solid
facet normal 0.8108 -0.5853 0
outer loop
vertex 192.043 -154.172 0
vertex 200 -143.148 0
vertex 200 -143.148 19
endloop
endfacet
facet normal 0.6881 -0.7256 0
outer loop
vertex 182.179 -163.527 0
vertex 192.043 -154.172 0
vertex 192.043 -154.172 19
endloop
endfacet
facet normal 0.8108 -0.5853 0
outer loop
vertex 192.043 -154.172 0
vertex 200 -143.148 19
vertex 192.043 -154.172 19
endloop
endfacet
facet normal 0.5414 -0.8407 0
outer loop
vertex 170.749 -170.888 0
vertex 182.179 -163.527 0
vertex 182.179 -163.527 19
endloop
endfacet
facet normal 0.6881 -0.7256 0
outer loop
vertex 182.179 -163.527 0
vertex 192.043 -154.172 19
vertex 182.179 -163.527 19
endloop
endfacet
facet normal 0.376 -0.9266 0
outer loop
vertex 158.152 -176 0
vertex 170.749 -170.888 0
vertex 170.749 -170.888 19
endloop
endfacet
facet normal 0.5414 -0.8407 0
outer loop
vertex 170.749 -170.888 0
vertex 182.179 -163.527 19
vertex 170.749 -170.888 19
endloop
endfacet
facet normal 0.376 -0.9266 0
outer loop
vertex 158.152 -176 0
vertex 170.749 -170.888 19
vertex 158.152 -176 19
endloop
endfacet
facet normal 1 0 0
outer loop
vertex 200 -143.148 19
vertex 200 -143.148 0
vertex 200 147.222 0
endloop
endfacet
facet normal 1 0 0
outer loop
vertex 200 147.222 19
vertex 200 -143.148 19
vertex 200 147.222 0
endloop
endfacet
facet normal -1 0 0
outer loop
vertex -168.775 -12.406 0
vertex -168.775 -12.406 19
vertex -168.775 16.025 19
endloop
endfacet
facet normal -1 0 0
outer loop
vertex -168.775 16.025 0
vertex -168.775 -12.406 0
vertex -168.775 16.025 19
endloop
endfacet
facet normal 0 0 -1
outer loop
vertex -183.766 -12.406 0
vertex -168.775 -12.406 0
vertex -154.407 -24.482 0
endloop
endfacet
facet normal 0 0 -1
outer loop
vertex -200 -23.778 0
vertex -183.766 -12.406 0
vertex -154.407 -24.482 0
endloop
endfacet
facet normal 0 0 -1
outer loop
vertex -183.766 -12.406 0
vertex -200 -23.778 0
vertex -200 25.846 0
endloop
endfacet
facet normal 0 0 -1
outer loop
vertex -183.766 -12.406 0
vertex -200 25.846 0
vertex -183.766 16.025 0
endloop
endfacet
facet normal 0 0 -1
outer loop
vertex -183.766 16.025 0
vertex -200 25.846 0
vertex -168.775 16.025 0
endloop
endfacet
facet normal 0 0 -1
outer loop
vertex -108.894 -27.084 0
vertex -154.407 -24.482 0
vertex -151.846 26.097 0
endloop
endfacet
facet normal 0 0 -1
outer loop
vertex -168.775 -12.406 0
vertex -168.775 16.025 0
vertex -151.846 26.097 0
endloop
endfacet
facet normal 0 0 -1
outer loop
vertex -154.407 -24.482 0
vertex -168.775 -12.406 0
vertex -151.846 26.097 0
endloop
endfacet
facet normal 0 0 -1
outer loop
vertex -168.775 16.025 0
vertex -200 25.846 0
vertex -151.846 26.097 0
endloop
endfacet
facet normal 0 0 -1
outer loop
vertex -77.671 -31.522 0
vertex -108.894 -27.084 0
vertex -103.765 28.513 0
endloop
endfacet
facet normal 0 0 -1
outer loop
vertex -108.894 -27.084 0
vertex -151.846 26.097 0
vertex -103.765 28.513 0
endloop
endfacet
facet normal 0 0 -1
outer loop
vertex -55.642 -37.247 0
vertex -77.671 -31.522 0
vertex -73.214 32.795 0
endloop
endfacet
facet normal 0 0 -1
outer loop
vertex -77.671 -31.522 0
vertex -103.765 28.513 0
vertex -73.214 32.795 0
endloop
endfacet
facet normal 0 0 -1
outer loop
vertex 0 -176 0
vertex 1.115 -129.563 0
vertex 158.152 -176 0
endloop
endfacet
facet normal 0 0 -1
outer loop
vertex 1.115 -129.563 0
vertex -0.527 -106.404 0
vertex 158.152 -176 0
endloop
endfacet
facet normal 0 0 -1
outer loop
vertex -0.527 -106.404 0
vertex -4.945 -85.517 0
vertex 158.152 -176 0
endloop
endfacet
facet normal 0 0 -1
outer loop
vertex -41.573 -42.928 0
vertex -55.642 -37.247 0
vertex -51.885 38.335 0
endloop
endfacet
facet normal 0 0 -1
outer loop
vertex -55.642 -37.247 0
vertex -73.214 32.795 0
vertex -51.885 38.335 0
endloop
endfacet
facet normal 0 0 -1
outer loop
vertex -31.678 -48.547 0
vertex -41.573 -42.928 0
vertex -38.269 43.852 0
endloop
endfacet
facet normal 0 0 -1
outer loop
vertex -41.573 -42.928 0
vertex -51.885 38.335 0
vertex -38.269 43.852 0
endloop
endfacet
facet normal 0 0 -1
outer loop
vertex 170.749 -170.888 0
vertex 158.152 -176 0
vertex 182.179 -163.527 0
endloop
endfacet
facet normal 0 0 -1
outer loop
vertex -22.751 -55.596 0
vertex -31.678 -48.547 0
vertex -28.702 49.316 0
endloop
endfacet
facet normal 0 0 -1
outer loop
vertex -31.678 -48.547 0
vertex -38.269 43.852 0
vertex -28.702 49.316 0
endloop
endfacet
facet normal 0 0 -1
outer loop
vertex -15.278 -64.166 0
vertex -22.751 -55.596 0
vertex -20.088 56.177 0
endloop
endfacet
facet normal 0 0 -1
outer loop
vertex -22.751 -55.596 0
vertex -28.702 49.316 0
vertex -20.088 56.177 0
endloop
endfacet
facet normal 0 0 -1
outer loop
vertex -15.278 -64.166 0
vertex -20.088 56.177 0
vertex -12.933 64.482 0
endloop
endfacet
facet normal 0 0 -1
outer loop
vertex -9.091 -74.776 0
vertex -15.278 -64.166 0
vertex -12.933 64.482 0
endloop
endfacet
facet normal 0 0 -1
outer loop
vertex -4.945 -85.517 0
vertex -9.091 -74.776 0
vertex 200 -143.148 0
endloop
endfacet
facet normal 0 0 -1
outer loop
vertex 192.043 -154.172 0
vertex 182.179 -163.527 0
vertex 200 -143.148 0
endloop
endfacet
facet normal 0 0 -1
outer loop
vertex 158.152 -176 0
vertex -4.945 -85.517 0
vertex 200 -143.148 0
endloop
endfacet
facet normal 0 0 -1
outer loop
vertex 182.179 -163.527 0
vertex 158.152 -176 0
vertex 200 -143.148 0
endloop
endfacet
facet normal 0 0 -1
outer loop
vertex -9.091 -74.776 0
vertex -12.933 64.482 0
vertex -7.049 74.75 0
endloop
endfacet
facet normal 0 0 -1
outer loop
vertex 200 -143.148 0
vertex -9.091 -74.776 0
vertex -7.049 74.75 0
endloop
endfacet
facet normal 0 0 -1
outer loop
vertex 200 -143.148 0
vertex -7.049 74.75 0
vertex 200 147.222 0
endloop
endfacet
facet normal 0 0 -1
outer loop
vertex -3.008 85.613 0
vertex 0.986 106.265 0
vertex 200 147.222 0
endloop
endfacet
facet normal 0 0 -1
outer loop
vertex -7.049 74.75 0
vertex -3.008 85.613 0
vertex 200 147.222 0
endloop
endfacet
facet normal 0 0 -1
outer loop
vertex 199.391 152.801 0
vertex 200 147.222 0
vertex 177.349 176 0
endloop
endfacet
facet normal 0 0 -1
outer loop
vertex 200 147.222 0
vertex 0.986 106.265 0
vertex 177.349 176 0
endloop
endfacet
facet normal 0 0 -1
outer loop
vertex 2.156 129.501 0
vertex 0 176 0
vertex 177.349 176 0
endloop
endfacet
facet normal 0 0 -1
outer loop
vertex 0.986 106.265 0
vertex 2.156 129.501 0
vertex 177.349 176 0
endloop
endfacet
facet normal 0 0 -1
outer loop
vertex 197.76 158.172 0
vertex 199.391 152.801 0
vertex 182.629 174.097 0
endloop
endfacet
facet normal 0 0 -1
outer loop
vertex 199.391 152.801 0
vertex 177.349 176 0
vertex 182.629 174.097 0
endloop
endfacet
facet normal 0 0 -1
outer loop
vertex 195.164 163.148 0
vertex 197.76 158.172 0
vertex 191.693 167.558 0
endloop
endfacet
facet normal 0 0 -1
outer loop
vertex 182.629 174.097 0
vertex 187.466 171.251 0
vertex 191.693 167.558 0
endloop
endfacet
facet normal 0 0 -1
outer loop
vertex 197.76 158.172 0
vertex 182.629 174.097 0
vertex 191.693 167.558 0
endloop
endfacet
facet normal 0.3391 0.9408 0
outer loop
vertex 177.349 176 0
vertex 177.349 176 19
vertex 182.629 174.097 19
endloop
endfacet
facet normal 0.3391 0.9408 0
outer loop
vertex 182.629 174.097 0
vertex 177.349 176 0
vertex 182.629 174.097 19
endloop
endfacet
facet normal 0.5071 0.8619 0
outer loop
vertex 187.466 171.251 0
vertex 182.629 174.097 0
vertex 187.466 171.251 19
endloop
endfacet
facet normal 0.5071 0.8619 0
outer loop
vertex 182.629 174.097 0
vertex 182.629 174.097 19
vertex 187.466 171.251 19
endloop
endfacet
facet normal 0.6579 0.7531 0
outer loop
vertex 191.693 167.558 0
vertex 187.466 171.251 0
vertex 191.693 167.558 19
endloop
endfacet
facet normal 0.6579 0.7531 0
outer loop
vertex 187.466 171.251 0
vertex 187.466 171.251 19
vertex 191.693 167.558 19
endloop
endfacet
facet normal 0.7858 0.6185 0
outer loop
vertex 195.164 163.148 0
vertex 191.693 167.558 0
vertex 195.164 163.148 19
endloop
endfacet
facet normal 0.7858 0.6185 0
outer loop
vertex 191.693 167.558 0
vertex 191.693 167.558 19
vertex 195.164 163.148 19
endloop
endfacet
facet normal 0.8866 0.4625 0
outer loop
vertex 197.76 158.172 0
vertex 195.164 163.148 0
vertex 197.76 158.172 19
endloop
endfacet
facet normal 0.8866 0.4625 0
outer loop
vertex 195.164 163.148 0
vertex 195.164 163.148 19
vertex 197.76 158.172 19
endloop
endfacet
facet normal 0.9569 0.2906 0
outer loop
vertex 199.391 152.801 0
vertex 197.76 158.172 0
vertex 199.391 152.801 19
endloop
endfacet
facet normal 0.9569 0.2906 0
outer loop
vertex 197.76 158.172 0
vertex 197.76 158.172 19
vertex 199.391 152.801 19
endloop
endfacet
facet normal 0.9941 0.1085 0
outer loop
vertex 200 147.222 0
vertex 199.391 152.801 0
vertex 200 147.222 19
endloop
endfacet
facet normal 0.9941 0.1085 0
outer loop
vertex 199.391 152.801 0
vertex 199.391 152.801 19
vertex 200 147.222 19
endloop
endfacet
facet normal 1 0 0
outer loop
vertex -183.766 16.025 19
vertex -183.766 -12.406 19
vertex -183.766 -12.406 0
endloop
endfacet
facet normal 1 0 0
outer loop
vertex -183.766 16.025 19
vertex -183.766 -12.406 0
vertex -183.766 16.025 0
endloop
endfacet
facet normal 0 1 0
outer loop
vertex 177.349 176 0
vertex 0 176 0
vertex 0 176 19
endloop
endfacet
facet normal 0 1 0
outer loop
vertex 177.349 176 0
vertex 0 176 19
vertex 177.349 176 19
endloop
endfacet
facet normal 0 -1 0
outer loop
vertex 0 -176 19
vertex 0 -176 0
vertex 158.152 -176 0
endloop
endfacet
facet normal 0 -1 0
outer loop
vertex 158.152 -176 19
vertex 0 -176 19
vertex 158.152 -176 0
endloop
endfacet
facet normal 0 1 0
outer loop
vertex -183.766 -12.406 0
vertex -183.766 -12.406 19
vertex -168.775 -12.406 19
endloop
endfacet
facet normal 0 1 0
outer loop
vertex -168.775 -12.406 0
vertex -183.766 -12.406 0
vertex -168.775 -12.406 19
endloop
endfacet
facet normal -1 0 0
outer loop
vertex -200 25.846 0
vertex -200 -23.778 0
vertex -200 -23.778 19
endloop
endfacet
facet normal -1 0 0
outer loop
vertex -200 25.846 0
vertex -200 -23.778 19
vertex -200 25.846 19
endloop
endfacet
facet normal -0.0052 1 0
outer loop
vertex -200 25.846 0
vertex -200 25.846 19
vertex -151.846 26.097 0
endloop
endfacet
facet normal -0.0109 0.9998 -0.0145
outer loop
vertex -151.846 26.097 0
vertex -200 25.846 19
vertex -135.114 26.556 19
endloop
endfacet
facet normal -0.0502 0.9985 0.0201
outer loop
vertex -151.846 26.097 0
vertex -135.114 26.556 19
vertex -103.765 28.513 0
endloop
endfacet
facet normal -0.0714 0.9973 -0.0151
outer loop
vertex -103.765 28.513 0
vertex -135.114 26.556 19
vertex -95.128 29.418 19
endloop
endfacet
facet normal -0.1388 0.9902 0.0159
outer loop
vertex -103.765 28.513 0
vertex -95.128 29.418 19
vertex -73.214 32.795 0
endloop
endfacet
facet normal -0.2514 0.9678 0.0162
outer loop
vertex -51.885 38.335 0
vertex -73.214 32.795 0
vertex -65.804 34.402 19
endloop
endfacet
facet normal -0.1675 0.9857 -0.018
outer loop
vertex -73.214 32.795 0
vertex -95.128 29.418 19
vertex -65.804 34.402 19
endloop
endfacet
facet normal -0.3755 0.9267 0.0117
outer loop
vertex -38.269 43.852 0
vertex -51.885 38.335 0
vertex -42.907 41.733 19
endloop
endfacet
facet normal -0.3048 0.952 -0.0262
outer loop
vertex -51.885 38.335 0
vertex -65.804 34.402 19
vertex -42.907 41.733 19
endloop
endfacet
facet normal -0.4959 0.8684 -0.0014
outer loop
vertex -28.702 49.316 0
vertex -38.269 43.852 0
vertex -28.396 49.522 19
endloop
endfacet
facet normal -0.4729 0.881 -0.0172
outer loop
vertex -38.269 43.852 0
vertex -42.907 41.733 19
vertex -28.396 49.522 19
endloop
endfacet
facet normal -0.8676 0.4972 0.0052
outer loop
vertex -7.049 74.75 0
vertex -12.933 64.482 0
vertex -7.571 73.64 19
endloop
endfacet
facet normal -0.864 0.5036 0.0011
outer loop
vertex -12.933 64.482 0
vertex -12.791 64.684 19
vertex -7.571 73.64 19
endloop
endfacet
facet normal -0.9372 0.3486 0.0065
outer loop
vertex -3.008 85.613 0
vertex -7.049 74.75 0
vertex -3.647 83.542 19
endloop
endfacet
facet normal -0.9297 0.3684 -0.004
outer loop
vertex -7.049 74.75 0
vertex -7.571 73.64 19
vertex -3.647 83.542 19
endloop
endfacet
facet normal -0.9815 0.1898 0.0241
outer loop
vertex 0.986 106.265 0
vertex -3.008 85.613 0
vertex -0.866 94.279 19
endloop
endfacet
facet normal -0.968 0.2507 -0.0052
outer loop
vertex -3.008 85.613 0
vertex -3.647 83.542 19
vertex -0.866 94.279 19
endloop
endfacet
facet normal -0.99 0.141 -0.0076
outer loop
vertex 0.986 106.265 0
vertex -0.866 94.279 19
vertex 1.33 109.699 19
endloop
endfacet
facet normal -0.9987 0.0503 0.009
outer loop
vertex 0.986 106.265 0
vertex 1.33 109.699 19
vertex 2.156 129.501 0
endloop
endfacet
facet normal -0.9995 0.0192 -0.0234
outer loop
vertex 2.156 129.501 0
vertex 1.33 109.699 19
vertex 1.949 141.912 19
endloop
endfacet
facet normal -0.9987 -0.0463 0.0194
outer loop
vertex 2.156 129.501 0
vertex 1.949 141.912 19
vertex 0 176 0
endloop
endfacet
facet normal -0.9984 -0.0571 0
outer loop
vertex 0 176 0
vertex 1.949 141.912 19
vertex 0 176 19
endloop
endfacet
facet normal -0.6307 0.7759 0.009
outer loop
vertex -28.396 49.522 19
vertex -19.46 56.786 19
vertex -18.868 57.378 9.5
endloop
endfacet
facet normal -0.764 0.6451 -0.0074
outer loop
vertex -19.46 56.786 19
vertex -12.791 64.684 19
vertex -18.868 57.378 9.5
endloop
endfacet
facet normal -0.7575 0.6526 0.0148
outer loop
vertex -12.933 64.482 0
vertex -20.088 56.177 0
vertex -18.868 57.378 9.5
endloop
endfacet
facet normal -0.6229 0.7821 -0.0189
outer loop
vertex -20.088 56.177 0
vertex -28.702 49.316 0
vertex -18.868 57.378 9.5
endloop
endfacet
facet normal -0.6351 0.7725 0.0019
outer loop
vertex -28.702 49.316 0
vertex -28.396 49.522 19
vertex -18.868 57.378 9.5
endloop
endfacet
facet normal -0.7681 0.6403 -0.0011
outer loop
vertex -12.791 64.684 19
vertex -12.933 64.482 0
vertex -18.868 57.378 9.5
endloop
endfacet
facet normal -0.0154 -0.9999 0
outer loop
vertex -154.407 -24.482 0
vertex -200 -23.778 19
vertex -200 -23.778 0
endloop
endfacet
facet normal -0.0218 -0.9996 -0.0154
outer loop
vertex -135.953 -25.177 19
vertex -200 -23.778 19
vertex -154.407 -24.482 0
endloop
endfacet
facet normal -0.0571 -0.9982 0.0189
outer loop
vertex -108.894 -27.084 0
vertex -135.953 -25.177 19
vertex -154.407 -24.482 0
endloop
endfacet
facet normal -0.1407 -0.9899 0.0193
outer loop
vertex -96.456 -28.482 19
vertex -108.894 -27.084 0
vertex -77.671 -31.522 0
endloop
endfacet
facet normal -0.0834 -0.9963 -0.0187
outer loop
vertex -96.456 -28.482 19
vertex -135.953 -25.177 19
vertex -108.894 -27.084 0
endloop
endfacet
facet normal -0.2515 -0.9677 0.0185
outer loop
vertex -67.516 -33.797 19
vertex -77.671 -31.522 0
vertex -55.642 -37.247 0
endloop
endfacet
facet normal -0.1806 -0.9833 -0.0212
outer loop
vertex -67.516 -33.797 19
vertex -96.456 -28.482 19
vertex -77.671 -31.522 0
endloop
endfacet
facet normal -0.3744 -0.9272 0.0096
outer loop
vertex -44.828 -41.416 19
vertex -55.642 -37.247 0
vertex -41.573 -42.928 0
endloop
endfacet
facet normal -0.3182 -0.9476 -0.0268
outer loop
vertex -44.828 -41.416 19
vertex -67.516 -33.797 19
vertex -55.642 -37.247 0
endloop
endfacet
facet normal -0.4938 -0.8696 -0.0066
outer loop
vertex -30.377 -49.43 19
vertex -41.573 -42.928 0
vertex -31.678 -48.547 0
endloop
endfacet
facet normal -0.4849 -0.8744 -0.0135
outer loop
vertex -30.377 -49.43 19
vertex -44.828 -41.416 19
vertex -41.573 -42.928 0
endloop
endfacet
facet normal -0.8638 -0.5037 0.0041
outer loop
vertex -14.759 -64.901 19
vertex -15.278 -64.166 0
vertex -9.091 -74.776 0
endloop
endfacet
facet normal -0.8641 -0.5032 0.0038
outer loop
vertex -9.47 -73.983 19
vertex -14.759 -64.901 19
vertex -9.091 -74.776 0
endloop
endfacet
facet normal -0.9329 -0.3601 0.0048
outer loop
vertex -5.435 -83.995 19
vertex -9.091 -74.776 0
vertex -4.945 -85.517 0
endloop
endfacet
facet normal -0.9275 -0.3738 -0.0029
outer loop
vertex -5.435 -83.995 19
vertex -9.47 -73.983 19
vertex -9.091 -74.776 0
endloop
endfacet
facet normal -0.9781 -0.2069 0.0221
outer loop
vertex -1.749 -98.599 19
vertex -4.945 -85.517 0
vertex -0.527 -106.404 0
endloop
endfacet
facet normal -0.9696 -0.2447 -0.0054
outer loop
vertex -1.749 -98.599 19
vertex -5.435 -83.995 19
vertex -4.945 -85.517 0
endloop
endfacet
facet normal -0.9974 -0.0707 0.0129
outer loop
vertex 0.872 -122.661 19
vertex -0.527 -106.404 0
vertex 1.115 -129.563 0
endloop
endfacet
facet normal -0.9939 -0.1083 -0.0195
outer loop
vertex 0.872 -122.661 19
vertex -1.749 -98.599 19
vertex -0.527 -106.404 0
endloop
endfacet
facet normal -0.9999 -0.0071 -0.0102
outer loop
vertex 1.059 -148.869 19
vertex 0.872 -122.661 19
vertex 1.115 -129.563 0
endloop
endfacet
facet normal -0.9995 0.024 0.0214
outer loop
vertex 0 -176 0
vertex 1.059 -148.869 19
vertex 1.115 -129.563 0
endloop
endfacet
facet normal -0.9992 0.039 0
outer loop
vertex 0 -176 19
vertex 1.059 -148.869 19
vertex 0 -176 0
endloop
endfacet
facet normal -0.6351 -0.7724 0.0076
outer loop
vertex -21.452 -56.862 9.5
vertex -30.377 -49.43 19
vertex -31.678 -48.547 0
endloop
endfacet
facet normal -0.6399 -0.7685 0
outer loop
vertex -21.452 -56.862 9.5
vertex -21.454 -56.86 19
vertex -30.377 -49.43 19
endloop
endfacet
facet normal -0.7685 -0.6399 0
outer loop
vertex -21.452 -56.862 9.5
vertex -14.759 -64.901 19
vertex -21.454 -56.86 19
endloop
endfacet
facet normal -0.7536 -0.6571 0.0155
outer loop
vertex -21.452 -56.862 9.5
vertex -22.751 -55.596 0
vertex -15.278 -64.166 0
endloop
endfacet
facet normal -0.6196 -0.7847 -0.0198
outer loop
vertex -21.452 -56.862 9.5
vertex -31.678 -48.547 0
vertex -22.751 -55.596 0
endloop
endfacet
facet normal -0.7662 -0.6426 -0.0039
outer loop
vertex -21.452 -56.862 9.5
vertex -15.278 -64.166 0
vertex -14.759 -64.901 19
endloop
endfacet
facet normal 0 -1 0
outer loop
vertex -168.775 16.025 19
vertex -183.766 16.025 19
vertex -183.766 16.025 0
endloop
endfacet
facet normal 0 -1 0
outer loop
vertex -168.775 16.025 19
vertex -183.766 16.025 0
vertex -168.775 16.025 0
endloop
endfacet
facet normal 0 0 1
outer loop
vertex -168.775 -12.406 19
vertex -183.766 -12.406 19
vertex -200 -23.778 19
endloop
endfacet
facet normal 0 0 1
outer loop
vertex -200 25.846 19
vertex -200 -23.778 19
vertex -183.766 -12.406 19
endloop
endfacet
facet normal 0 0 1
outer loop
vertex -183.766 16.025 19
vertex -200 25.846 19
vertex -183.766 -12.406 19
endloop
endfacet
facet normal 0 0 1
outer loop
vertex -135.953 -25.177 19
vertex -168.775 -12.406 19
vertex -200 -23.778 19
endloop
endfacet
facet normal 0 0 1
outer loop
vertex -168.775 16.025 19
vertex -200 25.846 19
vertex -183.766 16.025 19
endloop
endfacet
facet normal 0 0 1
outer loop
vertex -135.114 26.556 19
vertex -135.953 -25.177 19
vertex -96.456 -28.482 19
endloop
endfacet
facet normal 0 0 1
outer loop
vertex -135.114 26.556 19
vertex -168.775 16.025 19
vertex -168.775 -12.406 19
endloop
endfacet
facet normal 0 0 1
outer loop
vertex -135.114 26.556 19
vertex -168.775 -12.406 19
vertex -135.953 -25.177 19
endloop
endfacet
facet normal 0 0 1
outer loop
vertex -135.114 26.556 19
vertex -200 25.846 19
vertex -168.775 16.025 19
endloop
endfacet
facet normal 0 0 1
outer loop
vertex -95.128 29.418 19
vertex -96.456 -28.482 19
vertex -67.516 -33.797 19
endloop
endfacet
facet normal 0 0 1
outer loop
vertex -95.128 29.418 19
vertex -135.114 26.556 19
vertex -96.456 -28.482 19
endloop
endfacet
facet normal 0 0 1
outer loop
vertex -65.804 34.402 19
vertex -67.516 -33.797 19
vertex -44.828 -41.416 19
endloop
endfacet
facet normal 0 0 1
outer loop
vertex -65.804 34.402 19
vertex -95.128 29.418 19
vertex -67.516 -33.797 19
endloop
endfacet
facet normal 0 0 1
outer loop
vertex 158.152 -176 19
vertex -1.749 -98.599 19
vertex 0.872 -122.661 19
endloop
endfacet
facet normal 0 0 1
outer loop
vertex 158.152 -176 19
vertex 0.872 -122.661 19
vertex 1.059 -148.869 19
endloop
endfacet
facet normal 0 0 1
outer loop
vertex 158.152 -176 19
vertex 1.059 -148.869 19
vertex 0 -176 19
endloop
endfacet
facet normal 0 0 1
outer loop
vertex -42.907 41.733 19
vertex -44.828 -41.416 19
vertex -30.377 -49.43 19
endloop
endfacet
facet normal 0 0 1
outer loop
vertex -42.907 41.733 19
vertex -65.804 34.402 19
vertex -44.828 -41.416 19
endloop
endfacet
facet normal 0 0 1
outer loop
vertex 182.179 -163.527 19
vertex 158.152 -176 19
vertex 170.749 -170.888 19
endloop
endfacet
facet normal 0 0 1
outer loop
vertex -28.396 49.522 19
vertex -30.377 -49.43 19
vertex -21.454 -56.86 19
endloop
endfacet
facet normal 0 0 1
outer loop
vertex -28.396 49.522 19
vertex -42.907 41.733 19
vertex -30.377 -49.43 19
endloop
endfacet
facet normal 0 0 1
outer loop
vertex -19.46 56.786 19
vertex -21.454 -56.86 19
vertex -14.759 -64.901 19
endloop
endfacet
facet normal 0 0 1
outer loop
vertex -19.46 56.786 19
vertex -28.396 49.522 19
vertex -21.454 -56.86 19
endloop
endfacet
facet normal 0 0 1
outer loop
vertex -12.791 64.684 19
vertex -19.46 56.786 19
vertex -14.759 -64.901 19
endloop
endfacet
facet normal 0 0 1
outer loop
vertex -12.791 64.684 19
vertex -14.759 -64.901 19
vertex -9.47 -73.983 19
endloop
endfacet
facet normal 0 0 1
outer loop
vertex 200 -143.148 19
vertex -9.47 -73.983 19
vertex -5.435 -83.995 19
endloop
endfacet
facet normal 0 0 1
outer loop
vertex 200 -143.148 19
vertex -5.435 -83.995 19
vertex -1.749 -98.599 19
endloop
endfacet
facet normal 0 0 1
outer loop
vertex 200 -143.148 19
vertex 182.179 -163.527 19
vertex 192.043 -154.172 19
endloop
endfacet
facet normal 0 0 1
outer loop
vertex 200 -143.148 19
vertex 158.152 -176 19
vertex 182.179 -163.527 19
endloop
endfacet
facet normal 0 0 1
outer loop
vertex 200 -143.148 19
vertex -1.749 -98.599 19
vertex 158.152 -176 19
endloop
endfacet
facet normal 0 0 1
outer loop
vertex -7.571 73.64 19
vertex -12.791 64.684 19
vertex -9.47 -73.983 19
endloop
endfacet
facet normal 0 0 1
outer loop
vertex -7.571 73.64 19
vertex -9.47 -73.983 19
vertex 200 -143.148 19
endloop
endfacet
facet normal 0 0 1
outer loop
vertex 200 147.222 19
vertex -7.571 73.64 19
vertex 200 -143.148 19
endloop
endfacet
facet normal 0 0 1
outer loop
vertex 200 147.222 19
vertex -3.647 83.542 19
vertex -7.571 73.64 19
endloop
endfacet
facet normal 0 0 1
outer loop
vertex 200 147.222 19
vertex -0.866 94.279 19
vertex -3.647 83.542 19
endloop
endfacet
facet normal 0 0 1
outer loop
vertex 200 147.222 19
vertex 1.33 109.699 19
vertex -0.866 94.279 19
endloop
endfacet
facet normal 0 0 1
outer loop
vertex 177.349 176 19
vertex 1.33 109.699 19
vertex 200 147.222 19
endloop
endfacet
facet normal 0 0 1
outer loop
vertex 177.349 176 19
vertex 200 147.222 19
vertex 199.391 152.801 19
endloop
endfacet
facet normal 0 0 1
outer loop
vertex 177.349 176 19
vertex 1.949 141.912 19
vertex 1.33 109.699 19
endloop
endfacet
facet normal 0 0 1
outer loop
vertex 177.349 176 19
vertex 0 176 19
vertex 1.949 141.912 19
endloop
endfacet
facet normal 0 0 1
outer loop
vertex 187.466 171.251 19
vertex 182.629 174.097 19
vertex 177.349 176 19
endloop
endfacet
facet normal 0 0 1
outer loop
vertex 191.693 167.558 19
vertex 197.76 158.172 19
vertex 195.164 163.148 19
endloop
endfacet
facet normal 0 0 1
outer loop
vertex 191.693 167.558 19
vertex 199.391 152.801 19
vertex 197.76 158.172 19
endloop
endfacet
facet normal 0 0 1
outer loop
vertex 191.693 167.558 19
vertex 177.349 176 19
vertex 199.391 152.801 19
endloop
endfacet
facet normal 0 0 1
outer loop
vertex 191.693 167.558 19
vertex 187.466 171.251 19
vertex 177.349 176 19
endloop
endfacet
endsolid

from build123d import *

# Parameters (mm, degrees)
F0_W     = 400
F0_H     = 352
F1_DEPTH = 19
F3_DEPTH = 19.001
F5_DEPTH = 19.0010001
F6_W     = 14.9907767773
F6_H     = 28.43076922
F7_DEPTH = 19.0010001


with BuildPart() as f1:
    # F0 (on Top) → F1 (new body)
    with BuildSketch(Plane.XY):
        Rectangle(F0_W, F0_H)
    extrude(amount=F1_DEPTH)

    # F2 (on face) → F3 (cut, through all)
    with BuildSketch(Plane.XY.offset(19)):
        with BuildLine():
            add(Edge.make_bspline(
                [(-200, -23.7784627825), (-126.5126396068, -24.453447739), (6.9760460018, -25.6795477673), (2.163274492, -129.3855711593), (0, -176)],
                knots=[0, 0, 0, 0, 0.5505137762, 1, 1, 1, 1], degree=3))
            Line((-200, -23.7784627825), (-200, -176))
            Line((-200, -176), (0, -176))
        make_face()
        with BuildLine():
            Line((-200, 176), (-200, 25.8461534977))
            add(Edge.make_bspline(
                [(-200, 25.8461534977), (-125.0792777845, 25.7364442733), (10.3974148662, 25.5380606696), (3.211839993, 129.5211703688), (0, 176)],
                knots=[0, 0, 0, 0, 0.5530155833, 1, 1, 1, 1], degree=3))
            Line((0, 176), (-200, 176))
        make_face()
    extrude(amount=-F3_DEPTH, mode=Mode.SUBTRACT)

    # F4 (on face) → F5 (cut, through all)
    with BuildSketch(Plane.XY.offset(19)):
        with BuildLine():
            ThreePointArc((177.3485280662, 176), (193.531261968, 165.4340185307), (200, 147.2220370564))
            Line((200, 147.2220370564), (200, 176))
            Line((200, 176), (177.3485280662, 176))
        make_face()
        with BuildLine():
            ThreePointArc((200, -143.14840734), (182.1787262713, -163.5266665451), (158.1519246101, -176))
            Line((158.1519246101, -176), (200, -176))
            Line((200, -176), (200, -143.14840734))
        make_face()
    extrude(amount=-F5_DEPTH, mode=Mode.SUBTRACT)

    # F6 (on face) → F7 (cut, through all)
    with BuildSketch(Plane.XY.offset(19)):
        with Locations((-176.2707680464, 1.8092310056)):
            Rectangle(F6_W, F6_H)
    extrude(amount=-F7_DEPTH, mode=Mode.SUBTRACT)


solid = f1.part
